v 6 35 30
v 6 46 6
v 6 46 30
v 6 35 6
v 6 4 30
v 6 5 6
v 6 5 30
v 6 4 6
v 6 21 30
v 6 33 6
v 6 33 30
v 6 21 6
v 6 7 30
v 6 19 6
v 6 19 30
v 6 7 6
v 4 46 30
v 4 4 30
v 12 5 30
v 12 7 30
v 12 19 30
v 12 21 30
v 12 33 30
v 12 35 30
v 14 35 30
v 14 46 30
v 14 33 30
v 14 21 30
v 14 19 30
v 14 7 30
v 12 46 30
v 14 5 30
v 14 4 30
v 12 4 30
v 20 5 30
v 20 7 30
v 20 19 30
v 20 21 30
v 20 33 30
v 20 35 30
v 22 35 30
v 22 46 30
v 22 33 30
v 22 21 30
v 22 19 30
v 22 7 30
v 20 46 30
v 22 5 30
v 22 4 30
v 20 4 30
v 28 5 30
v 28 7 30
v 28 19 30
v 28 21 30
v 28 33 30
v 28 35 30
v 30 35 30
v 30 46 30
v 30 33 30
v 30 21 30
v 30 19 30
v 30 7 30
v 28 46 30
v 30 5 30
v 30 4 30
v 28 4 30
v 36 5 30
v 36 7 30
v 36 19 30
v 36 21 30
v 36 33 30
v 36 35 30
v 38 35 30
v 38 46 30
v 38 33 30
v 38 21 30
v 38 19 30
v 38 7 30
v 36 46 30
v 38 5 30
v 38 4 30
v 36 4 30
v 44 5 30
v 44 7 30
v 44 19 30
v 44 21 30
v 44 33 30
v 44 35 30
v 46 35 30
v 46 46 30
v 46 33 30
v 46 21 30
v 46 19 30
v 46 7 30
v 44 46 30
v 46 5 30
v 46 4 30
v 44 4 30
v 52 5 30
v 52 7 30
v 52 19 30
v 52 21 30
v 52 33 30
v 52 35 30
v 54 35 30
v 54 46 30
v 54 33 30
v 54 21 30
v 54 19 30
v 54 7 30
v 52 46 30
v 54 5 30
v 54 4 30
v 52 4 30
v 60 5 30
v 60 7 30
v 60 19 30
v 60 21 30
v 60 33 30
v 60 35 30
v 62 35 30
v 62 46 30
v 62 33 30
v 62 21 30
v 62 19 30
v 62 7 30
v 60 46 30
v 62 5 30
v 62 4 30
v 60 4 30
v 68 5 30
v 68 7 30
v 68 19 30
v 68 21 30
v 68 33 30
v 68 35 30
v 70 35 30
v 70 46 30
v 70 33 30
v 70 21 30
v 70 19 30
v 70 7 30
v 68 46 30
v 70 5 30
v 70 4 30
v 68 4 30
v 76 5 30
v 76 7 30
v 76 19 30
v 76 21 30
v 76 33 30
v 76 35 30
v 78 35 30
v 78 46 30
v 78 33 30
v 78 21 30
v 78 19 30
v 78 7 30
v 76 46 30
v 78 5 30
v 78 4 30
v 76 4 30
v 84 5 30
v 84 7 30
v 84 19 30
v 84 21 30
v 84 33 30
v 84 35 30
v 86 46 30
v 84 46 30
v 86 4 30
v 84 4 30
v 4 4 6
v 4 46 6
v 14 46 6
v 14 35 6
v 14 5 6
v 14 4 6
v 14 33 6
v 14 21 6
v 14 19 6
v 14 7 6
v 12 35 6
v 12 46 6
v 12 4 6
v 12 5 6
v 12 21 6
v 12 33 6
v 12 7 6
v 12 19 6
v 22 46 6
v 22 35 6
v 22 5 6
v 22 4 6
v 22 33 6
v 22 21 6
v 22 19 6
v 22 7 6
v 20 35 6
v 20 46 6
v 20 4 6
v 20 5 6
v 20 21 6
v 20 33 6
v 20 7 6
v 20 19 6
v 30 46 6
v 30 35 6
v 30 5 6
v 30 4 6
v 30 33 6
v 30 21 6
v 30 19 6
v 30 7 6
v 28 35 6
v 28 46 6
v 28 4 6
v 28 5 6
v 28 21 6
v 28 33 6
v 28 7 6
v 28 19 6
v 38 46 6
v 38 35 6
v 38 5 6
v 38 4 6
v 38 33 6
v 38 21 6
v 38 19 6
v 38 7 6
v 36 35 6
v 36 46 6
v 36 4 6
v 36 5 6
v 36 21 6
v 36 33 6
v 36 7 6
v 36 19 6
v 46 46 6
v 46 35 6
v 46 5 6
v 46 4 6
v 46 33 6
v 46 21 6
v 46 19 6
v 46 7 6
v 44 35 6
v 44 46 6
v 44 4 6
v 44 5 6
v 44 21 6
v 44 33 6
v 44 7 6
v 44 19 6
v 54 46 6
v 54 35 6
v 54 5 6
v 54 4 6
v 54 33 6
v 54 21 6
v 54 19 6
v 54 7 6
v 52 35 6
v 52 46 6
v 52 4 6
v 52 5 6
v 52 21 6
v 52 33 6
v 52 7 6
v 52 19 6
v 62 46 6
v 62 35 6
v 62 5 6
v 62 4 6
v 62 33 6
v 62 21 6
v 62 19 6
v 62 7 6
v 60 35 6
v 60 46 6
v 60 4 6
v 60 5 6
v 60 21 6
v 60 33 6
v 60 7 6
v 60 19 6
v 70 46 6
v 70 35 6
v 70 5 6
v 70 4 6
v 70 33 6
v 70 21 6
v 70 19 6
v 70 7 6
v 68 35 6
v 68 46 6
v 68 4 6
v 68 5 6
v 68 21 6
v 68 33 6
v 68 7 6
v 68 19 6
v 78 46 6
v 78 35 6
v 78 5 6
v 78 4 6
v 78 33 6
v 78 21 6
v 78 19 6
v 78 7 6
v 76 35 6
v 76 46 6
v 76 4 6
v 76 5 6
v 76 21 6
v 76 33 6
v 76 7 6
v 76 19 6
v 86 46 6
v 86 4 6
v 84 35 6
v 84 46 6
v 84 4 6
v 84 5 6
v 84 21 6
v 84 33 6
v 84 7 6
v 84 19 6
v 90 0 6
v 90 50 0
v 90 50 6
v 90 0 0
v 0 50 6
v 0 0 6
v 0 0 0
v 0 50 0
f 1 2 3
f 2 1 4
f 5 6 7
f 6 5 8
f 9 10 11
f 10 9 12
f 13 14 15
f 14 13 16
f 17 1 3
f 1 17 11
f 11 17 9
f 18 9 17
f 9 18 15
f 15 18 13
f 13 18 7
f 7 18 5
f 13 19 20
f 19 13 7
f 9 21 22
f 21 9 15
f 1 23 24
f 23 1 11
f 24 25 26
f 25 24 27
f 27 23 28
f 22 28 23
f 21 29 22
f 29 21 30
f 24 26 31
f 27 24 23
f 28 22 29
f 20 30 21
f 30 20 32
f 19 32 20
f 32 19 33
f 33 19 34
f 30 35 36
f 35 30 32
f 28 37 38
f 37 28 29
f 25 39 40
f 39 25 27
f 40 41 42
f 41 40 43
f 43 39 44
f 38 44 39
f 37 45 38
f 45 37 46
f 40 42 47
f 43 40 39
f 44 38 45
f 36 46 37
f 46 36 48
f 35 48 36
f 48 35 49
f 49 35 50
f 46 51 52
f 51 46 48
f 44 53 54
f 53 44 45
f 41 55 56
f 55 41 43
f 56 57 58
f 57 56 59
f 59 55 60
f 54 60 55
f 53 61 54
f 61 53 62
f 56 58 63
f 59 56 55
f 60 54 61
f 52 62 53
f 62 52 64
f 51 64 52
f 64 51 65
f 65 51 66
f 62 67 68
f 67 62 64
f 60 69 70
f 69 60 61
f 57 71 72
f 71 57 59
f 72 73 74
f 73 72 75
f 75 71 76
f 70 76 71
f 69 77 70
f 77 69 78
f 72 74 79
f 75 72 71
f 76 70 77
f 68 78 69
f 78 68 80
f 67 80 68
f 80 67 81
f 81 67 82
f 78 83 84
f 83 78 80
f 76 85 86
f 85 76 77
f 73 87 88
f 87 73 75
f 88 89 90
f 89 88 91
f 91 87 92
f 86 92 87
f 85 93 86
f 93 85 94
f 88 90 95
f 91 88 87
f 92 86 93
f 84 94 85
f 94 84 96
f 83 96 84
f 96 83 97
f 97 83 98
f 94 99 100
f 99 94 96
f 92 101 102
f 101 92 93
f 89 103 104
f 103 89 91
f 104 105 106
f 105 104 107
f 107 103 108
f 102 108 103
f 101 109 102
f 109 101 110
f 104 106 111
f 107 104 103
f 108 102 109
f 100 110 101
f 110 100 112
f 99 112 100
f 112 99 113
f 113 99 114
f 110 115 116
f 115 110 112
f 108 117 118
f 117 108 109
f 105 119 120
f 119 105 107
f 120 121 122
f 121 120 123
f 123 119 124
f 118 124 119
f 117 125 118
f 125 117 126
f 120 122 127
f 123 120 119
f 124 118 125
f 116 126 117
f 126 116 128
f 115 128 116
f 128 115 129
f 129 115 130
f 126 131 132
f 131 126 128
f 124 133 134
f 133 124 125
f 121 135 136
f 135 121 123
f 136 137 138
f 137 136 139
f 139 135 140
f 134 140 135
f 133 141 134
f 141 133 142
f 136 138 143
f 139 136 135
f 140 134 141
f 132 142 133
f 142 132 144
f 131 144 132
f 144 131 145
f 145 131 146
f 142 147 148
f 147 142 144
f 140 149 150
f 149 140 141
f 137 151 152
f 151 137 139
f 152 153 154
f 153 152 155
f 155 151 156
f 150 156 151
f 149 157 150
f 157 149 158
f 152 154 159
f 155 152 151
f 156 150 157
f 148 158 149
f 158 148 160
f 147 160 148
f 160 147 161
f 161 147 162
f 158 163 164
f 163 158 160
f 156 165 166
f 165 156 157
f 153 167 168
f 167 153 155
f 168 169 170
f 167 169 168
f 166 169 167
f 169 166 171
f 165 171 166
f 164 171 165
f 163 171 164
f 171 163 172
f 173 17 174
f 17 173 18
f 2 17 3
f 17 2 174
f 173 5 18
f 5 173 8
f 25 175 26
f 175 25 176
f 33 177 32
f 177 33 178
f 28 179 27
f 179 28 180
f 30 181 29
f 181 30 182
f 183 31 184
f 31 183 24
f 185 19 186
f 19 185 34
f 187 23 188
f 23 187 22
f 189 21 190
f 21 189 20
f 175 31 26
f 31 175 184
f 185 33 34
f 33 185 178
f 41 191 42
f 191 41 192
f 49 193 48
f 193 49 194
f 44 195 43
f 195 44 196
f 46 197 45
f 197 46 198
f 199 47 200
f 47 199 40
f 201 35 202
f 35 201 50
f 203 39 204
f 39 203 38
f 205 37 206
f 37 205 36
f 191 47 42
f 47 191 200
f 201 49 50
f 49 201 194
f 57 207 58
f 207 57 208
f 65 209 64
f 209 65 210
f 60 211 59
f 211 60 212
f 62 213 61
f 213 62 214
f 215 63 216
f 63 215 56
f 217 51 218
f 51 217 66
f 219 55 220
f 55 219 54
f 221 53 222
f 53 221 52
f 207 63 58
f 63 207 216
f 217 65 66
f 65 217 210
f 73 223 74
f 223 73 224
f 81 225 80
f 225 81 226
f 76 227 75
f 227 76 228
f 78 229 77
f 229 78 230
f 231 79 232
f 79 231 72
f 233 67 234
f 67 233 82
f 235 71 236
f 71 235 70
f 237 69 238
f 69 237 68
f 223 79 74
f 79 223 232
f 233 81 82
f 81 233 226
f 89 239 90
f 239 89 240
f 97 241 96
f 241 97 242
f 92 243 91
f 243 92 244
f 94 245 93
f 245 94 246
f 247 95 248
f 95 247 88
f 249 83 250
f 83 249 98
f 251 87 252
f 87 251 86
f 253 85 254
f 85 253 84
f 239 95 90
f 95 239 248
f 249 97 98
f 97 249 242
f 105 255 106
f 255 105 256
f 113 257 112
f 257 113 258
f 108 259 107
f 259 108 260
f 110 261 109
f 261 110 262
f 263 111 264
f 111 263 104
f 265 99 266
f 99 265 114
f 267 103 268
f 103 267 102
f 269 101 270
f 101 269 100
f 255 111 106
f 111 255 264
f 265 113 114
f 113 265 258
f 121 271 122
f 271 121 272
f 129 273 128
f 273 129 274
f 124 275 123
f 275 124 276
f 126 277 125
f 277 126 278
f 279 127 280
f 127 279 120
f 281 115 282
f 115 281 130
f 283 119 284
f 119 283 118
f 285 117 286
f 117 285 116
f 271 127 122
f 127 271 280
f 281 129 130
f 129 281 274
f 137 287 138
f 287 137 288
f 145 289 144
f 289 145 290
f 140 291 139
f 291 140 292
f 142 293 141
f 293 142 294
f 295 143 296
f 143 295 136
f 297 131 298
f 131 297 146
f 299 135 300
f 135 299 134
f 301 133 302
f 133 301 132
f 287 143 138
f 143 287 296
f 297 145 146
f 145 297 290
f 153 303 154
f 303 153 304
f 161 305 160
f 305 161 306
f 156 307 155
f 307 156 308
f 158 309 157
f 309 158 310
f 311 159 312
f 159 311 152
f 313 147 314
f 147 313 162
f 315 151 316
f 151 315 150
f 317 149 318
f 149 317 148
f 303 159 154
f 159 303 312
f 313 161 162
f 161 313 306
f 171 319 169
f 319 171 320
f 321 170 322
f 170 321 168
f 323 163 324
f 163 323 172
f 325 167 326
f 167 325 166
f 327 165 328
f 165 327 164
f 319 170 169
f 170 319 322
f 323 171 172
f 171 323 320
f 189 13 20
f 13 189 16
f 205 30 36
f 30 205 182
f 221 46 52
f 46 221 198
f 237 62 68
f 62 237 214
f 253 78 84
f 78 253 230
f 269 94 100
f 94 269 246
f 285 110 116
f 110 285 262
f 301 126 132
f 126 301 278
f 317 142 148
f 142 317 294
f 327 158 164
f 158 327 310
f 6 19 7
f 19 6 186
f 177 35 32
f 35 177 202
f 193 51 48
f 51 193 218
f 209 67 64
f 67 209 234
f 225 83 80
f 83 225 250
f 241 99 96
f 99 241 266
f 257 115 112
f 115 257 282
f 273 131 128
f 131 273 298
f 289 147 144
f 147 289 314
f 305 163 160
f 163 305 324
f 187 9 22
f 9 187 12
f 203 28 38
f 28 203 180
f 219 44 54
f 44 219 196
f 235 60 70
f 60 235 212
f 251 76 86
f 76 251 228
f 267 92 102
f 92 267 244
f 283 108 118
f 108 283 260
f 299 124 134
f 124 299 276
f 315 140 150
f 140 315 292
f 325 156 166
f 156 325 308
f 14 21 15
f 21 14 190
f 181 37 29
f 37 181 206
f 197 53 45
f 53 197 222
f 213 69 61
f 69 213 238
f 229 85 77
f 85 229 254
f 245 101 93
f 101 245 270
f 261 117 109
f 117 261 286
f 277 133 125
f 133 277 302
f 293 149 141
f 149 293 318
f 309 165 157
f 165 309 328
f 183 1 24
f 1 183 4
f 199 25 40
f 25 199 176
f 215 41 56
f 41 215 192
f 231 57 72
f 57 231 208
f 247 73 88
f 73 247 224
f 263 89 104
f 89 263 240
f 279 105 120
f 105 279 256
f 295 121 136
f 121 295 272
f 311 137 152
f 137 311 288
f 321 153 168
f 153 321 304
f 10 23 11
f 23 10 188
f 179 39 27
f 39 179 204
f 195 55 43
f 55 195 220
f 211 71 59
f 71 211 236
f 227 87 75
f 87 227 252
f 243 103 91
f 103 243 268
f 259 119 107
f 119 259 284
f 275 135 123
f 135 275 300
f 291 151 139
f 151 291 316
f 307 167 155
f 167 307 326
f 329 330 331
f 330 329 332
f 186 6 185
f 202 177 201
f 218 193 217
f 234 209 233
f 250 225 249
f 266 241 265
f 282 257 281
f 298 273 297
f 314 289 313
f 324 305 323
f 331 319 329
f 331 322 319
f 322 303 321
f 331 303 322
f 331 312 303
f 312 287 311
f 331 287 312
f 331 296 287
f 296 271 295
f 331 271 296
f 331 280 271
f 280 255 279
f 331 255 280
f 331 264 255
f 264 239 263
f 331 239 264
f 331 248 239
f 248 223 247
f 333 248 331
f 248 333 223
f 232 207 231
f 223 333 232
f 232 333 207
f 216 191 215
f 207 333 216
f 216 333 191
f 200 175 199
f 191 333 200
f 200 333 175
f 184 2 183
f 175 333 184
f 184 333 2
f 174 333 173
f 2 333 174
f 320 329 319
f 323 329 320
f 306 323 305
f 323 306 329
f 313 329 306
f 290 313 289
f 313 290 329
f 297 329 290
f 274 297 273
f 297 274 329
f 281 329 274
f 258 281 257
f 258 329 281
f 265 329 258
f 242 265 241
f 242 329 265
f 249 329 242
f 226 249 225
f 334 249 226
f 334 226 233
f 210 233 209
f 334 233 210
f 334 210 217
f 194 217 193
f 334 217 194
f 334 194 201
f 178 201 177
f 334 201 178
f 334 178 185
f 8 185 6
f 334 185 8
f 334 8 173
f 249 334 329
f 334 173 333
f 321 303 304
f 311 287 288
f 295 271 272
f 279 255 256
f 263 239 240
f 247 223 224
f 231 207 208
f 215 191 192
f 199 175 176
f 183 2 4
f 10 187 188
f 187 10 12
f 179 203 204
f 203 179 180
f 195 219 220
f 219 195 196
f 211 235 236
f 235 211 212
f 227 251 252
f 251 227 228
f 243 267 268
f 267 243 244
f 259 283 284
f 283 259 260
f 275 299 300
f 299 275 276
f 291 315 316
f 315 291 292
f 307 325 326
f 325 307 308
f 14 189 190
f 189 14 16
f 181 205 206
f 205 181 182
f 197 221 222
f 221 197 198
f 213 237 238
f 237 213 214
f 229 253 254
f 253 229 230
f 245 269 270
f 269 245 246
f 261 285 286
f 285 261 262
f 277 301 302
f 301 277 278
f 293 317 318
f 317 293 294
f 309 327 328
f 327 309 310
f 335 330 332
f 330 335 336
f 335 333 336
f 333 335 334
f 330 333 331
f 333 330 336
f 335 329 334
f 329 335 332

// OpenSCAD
$fn = 32;

// ----------------------------------------------------------------------
// Heatsink: cross fin block
// ----------------------------------------------------------------------

// --- parameters (mm) ---
base_l = 90;              // base length, X
base_w = 50;              // base width, Y
base_t = 6;               // base plate thickness
fin_h = 25;               // fin height above the base
fin_t = 2;                // fin thickness
edge = 4;                 // margin from the base ends
pitch = 8;                // fin pitch
rib_pitch = 14;           // cross rib pitch
fit_tol = 0.1;            // tolerance for press fits, mm
free_tol = 0.3;           // tolerance for clearance fits, mm

n_fins = floor((base_l - 2 * edge - fin_t) / pitch) + 1;  // fin count
total_h = base_t + fin_h - 1;  // overall height
n_ribs = floor((base_w - 2 * edge) / rib_pitch);  // rib count

union() {
  cube([base_l, base_w, base_t]);
  for (i = [0 : n_fins - 1])
    translate([edge + i * pitch, edge, base_t - 1])
      cube([fin_t, base_w - 2 * edge, fin_h]);
  for (i = [0 : n_ribs - 1])
    translate([edge, edge + 1 + i * rib_pitch, base_t - 1])
      cube([base_l - 2 * edge, fin_t, fin_h]);
}
